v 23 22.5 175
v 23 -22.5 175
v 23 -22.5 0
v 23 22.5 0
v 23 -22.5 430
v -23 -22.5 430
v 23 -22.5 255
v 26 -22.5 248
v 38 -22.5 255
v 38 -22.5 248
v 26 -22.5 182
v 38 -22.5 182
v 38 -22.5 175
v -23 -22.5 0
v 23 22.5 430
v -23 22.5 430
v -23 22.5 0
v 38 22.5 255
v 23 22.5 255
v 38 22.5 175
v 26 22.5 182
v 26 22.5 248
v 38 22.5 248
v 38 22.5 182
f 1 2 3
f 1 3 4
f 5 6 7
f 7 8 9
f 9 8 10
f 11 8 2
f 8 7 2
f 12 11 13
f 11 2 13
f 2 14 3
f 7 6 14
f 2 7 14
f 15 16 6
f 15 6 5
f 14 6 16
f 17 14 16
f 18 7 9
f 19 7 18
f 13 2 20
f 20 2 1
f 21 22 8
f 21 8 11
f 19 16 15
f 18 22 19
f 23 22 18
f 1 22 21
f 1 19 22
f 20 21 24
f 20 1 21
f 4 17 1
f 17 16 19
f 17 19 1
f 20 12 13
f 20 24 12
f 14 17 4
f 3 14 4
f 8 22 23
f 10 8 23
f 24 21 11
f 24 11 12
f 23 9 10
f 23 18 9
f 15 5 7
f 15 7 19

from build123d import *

# Parameters (mm, degrees)
SKETCH1_W           = 46
SKETCH1_H           = 45
BOSS_EXTRUDE1_DEPTH = 430
SKETCH2_W           = 40
SKETCH2_H           = 45
BOSS_EXTRUDE2_DEPTH = 15
SKETCH3_W           = 12
SKETCH3_H           = 66
CUT_EXTRUDE2_DEPTH  = 3434


with BuildPart() as part:
    # Sketch1 → Boss-Extrude1 (new body)
    with BuildSketch(Plane.XY):
        Rectangle(SKETCH1_W, SKETCH1_H)
    extrude(amount=BOSS_EXTRUDE1_DEPTH)

    # Sketch2 → Boss-Extrude2 (add)
    with BuildSketch(Plane(origin=(23, 0, 0), x_dir=(0, 0, -1), z_dir=(1, 0, 0))):
        with Locations((-195, 0)):
            Rectangle(SKETCH2_W, SKETCH2_H)
        with Locations((-235, 0)):
            Rectangle(SKETCH2_W, SKETCH2_H)
    extrude(amount=BOSS_EXTRUDE2_DEPTH)

    # Sketch3 → Cut-Extrude2 (cut)
    with BuildSketch(Plane(origin=(0, 22.5, 0), x_dir=(1, 0, 0), z_dir=(0, 1, 0))):
        with Locations((32, -215)):
            Rectangle(SKETCH3_W, SKETCH3_H)
    extrude(amount=-CUT_EXTRUDE2_DEPTH, mode=Mode.SUBTRACT)


solid = part.part
